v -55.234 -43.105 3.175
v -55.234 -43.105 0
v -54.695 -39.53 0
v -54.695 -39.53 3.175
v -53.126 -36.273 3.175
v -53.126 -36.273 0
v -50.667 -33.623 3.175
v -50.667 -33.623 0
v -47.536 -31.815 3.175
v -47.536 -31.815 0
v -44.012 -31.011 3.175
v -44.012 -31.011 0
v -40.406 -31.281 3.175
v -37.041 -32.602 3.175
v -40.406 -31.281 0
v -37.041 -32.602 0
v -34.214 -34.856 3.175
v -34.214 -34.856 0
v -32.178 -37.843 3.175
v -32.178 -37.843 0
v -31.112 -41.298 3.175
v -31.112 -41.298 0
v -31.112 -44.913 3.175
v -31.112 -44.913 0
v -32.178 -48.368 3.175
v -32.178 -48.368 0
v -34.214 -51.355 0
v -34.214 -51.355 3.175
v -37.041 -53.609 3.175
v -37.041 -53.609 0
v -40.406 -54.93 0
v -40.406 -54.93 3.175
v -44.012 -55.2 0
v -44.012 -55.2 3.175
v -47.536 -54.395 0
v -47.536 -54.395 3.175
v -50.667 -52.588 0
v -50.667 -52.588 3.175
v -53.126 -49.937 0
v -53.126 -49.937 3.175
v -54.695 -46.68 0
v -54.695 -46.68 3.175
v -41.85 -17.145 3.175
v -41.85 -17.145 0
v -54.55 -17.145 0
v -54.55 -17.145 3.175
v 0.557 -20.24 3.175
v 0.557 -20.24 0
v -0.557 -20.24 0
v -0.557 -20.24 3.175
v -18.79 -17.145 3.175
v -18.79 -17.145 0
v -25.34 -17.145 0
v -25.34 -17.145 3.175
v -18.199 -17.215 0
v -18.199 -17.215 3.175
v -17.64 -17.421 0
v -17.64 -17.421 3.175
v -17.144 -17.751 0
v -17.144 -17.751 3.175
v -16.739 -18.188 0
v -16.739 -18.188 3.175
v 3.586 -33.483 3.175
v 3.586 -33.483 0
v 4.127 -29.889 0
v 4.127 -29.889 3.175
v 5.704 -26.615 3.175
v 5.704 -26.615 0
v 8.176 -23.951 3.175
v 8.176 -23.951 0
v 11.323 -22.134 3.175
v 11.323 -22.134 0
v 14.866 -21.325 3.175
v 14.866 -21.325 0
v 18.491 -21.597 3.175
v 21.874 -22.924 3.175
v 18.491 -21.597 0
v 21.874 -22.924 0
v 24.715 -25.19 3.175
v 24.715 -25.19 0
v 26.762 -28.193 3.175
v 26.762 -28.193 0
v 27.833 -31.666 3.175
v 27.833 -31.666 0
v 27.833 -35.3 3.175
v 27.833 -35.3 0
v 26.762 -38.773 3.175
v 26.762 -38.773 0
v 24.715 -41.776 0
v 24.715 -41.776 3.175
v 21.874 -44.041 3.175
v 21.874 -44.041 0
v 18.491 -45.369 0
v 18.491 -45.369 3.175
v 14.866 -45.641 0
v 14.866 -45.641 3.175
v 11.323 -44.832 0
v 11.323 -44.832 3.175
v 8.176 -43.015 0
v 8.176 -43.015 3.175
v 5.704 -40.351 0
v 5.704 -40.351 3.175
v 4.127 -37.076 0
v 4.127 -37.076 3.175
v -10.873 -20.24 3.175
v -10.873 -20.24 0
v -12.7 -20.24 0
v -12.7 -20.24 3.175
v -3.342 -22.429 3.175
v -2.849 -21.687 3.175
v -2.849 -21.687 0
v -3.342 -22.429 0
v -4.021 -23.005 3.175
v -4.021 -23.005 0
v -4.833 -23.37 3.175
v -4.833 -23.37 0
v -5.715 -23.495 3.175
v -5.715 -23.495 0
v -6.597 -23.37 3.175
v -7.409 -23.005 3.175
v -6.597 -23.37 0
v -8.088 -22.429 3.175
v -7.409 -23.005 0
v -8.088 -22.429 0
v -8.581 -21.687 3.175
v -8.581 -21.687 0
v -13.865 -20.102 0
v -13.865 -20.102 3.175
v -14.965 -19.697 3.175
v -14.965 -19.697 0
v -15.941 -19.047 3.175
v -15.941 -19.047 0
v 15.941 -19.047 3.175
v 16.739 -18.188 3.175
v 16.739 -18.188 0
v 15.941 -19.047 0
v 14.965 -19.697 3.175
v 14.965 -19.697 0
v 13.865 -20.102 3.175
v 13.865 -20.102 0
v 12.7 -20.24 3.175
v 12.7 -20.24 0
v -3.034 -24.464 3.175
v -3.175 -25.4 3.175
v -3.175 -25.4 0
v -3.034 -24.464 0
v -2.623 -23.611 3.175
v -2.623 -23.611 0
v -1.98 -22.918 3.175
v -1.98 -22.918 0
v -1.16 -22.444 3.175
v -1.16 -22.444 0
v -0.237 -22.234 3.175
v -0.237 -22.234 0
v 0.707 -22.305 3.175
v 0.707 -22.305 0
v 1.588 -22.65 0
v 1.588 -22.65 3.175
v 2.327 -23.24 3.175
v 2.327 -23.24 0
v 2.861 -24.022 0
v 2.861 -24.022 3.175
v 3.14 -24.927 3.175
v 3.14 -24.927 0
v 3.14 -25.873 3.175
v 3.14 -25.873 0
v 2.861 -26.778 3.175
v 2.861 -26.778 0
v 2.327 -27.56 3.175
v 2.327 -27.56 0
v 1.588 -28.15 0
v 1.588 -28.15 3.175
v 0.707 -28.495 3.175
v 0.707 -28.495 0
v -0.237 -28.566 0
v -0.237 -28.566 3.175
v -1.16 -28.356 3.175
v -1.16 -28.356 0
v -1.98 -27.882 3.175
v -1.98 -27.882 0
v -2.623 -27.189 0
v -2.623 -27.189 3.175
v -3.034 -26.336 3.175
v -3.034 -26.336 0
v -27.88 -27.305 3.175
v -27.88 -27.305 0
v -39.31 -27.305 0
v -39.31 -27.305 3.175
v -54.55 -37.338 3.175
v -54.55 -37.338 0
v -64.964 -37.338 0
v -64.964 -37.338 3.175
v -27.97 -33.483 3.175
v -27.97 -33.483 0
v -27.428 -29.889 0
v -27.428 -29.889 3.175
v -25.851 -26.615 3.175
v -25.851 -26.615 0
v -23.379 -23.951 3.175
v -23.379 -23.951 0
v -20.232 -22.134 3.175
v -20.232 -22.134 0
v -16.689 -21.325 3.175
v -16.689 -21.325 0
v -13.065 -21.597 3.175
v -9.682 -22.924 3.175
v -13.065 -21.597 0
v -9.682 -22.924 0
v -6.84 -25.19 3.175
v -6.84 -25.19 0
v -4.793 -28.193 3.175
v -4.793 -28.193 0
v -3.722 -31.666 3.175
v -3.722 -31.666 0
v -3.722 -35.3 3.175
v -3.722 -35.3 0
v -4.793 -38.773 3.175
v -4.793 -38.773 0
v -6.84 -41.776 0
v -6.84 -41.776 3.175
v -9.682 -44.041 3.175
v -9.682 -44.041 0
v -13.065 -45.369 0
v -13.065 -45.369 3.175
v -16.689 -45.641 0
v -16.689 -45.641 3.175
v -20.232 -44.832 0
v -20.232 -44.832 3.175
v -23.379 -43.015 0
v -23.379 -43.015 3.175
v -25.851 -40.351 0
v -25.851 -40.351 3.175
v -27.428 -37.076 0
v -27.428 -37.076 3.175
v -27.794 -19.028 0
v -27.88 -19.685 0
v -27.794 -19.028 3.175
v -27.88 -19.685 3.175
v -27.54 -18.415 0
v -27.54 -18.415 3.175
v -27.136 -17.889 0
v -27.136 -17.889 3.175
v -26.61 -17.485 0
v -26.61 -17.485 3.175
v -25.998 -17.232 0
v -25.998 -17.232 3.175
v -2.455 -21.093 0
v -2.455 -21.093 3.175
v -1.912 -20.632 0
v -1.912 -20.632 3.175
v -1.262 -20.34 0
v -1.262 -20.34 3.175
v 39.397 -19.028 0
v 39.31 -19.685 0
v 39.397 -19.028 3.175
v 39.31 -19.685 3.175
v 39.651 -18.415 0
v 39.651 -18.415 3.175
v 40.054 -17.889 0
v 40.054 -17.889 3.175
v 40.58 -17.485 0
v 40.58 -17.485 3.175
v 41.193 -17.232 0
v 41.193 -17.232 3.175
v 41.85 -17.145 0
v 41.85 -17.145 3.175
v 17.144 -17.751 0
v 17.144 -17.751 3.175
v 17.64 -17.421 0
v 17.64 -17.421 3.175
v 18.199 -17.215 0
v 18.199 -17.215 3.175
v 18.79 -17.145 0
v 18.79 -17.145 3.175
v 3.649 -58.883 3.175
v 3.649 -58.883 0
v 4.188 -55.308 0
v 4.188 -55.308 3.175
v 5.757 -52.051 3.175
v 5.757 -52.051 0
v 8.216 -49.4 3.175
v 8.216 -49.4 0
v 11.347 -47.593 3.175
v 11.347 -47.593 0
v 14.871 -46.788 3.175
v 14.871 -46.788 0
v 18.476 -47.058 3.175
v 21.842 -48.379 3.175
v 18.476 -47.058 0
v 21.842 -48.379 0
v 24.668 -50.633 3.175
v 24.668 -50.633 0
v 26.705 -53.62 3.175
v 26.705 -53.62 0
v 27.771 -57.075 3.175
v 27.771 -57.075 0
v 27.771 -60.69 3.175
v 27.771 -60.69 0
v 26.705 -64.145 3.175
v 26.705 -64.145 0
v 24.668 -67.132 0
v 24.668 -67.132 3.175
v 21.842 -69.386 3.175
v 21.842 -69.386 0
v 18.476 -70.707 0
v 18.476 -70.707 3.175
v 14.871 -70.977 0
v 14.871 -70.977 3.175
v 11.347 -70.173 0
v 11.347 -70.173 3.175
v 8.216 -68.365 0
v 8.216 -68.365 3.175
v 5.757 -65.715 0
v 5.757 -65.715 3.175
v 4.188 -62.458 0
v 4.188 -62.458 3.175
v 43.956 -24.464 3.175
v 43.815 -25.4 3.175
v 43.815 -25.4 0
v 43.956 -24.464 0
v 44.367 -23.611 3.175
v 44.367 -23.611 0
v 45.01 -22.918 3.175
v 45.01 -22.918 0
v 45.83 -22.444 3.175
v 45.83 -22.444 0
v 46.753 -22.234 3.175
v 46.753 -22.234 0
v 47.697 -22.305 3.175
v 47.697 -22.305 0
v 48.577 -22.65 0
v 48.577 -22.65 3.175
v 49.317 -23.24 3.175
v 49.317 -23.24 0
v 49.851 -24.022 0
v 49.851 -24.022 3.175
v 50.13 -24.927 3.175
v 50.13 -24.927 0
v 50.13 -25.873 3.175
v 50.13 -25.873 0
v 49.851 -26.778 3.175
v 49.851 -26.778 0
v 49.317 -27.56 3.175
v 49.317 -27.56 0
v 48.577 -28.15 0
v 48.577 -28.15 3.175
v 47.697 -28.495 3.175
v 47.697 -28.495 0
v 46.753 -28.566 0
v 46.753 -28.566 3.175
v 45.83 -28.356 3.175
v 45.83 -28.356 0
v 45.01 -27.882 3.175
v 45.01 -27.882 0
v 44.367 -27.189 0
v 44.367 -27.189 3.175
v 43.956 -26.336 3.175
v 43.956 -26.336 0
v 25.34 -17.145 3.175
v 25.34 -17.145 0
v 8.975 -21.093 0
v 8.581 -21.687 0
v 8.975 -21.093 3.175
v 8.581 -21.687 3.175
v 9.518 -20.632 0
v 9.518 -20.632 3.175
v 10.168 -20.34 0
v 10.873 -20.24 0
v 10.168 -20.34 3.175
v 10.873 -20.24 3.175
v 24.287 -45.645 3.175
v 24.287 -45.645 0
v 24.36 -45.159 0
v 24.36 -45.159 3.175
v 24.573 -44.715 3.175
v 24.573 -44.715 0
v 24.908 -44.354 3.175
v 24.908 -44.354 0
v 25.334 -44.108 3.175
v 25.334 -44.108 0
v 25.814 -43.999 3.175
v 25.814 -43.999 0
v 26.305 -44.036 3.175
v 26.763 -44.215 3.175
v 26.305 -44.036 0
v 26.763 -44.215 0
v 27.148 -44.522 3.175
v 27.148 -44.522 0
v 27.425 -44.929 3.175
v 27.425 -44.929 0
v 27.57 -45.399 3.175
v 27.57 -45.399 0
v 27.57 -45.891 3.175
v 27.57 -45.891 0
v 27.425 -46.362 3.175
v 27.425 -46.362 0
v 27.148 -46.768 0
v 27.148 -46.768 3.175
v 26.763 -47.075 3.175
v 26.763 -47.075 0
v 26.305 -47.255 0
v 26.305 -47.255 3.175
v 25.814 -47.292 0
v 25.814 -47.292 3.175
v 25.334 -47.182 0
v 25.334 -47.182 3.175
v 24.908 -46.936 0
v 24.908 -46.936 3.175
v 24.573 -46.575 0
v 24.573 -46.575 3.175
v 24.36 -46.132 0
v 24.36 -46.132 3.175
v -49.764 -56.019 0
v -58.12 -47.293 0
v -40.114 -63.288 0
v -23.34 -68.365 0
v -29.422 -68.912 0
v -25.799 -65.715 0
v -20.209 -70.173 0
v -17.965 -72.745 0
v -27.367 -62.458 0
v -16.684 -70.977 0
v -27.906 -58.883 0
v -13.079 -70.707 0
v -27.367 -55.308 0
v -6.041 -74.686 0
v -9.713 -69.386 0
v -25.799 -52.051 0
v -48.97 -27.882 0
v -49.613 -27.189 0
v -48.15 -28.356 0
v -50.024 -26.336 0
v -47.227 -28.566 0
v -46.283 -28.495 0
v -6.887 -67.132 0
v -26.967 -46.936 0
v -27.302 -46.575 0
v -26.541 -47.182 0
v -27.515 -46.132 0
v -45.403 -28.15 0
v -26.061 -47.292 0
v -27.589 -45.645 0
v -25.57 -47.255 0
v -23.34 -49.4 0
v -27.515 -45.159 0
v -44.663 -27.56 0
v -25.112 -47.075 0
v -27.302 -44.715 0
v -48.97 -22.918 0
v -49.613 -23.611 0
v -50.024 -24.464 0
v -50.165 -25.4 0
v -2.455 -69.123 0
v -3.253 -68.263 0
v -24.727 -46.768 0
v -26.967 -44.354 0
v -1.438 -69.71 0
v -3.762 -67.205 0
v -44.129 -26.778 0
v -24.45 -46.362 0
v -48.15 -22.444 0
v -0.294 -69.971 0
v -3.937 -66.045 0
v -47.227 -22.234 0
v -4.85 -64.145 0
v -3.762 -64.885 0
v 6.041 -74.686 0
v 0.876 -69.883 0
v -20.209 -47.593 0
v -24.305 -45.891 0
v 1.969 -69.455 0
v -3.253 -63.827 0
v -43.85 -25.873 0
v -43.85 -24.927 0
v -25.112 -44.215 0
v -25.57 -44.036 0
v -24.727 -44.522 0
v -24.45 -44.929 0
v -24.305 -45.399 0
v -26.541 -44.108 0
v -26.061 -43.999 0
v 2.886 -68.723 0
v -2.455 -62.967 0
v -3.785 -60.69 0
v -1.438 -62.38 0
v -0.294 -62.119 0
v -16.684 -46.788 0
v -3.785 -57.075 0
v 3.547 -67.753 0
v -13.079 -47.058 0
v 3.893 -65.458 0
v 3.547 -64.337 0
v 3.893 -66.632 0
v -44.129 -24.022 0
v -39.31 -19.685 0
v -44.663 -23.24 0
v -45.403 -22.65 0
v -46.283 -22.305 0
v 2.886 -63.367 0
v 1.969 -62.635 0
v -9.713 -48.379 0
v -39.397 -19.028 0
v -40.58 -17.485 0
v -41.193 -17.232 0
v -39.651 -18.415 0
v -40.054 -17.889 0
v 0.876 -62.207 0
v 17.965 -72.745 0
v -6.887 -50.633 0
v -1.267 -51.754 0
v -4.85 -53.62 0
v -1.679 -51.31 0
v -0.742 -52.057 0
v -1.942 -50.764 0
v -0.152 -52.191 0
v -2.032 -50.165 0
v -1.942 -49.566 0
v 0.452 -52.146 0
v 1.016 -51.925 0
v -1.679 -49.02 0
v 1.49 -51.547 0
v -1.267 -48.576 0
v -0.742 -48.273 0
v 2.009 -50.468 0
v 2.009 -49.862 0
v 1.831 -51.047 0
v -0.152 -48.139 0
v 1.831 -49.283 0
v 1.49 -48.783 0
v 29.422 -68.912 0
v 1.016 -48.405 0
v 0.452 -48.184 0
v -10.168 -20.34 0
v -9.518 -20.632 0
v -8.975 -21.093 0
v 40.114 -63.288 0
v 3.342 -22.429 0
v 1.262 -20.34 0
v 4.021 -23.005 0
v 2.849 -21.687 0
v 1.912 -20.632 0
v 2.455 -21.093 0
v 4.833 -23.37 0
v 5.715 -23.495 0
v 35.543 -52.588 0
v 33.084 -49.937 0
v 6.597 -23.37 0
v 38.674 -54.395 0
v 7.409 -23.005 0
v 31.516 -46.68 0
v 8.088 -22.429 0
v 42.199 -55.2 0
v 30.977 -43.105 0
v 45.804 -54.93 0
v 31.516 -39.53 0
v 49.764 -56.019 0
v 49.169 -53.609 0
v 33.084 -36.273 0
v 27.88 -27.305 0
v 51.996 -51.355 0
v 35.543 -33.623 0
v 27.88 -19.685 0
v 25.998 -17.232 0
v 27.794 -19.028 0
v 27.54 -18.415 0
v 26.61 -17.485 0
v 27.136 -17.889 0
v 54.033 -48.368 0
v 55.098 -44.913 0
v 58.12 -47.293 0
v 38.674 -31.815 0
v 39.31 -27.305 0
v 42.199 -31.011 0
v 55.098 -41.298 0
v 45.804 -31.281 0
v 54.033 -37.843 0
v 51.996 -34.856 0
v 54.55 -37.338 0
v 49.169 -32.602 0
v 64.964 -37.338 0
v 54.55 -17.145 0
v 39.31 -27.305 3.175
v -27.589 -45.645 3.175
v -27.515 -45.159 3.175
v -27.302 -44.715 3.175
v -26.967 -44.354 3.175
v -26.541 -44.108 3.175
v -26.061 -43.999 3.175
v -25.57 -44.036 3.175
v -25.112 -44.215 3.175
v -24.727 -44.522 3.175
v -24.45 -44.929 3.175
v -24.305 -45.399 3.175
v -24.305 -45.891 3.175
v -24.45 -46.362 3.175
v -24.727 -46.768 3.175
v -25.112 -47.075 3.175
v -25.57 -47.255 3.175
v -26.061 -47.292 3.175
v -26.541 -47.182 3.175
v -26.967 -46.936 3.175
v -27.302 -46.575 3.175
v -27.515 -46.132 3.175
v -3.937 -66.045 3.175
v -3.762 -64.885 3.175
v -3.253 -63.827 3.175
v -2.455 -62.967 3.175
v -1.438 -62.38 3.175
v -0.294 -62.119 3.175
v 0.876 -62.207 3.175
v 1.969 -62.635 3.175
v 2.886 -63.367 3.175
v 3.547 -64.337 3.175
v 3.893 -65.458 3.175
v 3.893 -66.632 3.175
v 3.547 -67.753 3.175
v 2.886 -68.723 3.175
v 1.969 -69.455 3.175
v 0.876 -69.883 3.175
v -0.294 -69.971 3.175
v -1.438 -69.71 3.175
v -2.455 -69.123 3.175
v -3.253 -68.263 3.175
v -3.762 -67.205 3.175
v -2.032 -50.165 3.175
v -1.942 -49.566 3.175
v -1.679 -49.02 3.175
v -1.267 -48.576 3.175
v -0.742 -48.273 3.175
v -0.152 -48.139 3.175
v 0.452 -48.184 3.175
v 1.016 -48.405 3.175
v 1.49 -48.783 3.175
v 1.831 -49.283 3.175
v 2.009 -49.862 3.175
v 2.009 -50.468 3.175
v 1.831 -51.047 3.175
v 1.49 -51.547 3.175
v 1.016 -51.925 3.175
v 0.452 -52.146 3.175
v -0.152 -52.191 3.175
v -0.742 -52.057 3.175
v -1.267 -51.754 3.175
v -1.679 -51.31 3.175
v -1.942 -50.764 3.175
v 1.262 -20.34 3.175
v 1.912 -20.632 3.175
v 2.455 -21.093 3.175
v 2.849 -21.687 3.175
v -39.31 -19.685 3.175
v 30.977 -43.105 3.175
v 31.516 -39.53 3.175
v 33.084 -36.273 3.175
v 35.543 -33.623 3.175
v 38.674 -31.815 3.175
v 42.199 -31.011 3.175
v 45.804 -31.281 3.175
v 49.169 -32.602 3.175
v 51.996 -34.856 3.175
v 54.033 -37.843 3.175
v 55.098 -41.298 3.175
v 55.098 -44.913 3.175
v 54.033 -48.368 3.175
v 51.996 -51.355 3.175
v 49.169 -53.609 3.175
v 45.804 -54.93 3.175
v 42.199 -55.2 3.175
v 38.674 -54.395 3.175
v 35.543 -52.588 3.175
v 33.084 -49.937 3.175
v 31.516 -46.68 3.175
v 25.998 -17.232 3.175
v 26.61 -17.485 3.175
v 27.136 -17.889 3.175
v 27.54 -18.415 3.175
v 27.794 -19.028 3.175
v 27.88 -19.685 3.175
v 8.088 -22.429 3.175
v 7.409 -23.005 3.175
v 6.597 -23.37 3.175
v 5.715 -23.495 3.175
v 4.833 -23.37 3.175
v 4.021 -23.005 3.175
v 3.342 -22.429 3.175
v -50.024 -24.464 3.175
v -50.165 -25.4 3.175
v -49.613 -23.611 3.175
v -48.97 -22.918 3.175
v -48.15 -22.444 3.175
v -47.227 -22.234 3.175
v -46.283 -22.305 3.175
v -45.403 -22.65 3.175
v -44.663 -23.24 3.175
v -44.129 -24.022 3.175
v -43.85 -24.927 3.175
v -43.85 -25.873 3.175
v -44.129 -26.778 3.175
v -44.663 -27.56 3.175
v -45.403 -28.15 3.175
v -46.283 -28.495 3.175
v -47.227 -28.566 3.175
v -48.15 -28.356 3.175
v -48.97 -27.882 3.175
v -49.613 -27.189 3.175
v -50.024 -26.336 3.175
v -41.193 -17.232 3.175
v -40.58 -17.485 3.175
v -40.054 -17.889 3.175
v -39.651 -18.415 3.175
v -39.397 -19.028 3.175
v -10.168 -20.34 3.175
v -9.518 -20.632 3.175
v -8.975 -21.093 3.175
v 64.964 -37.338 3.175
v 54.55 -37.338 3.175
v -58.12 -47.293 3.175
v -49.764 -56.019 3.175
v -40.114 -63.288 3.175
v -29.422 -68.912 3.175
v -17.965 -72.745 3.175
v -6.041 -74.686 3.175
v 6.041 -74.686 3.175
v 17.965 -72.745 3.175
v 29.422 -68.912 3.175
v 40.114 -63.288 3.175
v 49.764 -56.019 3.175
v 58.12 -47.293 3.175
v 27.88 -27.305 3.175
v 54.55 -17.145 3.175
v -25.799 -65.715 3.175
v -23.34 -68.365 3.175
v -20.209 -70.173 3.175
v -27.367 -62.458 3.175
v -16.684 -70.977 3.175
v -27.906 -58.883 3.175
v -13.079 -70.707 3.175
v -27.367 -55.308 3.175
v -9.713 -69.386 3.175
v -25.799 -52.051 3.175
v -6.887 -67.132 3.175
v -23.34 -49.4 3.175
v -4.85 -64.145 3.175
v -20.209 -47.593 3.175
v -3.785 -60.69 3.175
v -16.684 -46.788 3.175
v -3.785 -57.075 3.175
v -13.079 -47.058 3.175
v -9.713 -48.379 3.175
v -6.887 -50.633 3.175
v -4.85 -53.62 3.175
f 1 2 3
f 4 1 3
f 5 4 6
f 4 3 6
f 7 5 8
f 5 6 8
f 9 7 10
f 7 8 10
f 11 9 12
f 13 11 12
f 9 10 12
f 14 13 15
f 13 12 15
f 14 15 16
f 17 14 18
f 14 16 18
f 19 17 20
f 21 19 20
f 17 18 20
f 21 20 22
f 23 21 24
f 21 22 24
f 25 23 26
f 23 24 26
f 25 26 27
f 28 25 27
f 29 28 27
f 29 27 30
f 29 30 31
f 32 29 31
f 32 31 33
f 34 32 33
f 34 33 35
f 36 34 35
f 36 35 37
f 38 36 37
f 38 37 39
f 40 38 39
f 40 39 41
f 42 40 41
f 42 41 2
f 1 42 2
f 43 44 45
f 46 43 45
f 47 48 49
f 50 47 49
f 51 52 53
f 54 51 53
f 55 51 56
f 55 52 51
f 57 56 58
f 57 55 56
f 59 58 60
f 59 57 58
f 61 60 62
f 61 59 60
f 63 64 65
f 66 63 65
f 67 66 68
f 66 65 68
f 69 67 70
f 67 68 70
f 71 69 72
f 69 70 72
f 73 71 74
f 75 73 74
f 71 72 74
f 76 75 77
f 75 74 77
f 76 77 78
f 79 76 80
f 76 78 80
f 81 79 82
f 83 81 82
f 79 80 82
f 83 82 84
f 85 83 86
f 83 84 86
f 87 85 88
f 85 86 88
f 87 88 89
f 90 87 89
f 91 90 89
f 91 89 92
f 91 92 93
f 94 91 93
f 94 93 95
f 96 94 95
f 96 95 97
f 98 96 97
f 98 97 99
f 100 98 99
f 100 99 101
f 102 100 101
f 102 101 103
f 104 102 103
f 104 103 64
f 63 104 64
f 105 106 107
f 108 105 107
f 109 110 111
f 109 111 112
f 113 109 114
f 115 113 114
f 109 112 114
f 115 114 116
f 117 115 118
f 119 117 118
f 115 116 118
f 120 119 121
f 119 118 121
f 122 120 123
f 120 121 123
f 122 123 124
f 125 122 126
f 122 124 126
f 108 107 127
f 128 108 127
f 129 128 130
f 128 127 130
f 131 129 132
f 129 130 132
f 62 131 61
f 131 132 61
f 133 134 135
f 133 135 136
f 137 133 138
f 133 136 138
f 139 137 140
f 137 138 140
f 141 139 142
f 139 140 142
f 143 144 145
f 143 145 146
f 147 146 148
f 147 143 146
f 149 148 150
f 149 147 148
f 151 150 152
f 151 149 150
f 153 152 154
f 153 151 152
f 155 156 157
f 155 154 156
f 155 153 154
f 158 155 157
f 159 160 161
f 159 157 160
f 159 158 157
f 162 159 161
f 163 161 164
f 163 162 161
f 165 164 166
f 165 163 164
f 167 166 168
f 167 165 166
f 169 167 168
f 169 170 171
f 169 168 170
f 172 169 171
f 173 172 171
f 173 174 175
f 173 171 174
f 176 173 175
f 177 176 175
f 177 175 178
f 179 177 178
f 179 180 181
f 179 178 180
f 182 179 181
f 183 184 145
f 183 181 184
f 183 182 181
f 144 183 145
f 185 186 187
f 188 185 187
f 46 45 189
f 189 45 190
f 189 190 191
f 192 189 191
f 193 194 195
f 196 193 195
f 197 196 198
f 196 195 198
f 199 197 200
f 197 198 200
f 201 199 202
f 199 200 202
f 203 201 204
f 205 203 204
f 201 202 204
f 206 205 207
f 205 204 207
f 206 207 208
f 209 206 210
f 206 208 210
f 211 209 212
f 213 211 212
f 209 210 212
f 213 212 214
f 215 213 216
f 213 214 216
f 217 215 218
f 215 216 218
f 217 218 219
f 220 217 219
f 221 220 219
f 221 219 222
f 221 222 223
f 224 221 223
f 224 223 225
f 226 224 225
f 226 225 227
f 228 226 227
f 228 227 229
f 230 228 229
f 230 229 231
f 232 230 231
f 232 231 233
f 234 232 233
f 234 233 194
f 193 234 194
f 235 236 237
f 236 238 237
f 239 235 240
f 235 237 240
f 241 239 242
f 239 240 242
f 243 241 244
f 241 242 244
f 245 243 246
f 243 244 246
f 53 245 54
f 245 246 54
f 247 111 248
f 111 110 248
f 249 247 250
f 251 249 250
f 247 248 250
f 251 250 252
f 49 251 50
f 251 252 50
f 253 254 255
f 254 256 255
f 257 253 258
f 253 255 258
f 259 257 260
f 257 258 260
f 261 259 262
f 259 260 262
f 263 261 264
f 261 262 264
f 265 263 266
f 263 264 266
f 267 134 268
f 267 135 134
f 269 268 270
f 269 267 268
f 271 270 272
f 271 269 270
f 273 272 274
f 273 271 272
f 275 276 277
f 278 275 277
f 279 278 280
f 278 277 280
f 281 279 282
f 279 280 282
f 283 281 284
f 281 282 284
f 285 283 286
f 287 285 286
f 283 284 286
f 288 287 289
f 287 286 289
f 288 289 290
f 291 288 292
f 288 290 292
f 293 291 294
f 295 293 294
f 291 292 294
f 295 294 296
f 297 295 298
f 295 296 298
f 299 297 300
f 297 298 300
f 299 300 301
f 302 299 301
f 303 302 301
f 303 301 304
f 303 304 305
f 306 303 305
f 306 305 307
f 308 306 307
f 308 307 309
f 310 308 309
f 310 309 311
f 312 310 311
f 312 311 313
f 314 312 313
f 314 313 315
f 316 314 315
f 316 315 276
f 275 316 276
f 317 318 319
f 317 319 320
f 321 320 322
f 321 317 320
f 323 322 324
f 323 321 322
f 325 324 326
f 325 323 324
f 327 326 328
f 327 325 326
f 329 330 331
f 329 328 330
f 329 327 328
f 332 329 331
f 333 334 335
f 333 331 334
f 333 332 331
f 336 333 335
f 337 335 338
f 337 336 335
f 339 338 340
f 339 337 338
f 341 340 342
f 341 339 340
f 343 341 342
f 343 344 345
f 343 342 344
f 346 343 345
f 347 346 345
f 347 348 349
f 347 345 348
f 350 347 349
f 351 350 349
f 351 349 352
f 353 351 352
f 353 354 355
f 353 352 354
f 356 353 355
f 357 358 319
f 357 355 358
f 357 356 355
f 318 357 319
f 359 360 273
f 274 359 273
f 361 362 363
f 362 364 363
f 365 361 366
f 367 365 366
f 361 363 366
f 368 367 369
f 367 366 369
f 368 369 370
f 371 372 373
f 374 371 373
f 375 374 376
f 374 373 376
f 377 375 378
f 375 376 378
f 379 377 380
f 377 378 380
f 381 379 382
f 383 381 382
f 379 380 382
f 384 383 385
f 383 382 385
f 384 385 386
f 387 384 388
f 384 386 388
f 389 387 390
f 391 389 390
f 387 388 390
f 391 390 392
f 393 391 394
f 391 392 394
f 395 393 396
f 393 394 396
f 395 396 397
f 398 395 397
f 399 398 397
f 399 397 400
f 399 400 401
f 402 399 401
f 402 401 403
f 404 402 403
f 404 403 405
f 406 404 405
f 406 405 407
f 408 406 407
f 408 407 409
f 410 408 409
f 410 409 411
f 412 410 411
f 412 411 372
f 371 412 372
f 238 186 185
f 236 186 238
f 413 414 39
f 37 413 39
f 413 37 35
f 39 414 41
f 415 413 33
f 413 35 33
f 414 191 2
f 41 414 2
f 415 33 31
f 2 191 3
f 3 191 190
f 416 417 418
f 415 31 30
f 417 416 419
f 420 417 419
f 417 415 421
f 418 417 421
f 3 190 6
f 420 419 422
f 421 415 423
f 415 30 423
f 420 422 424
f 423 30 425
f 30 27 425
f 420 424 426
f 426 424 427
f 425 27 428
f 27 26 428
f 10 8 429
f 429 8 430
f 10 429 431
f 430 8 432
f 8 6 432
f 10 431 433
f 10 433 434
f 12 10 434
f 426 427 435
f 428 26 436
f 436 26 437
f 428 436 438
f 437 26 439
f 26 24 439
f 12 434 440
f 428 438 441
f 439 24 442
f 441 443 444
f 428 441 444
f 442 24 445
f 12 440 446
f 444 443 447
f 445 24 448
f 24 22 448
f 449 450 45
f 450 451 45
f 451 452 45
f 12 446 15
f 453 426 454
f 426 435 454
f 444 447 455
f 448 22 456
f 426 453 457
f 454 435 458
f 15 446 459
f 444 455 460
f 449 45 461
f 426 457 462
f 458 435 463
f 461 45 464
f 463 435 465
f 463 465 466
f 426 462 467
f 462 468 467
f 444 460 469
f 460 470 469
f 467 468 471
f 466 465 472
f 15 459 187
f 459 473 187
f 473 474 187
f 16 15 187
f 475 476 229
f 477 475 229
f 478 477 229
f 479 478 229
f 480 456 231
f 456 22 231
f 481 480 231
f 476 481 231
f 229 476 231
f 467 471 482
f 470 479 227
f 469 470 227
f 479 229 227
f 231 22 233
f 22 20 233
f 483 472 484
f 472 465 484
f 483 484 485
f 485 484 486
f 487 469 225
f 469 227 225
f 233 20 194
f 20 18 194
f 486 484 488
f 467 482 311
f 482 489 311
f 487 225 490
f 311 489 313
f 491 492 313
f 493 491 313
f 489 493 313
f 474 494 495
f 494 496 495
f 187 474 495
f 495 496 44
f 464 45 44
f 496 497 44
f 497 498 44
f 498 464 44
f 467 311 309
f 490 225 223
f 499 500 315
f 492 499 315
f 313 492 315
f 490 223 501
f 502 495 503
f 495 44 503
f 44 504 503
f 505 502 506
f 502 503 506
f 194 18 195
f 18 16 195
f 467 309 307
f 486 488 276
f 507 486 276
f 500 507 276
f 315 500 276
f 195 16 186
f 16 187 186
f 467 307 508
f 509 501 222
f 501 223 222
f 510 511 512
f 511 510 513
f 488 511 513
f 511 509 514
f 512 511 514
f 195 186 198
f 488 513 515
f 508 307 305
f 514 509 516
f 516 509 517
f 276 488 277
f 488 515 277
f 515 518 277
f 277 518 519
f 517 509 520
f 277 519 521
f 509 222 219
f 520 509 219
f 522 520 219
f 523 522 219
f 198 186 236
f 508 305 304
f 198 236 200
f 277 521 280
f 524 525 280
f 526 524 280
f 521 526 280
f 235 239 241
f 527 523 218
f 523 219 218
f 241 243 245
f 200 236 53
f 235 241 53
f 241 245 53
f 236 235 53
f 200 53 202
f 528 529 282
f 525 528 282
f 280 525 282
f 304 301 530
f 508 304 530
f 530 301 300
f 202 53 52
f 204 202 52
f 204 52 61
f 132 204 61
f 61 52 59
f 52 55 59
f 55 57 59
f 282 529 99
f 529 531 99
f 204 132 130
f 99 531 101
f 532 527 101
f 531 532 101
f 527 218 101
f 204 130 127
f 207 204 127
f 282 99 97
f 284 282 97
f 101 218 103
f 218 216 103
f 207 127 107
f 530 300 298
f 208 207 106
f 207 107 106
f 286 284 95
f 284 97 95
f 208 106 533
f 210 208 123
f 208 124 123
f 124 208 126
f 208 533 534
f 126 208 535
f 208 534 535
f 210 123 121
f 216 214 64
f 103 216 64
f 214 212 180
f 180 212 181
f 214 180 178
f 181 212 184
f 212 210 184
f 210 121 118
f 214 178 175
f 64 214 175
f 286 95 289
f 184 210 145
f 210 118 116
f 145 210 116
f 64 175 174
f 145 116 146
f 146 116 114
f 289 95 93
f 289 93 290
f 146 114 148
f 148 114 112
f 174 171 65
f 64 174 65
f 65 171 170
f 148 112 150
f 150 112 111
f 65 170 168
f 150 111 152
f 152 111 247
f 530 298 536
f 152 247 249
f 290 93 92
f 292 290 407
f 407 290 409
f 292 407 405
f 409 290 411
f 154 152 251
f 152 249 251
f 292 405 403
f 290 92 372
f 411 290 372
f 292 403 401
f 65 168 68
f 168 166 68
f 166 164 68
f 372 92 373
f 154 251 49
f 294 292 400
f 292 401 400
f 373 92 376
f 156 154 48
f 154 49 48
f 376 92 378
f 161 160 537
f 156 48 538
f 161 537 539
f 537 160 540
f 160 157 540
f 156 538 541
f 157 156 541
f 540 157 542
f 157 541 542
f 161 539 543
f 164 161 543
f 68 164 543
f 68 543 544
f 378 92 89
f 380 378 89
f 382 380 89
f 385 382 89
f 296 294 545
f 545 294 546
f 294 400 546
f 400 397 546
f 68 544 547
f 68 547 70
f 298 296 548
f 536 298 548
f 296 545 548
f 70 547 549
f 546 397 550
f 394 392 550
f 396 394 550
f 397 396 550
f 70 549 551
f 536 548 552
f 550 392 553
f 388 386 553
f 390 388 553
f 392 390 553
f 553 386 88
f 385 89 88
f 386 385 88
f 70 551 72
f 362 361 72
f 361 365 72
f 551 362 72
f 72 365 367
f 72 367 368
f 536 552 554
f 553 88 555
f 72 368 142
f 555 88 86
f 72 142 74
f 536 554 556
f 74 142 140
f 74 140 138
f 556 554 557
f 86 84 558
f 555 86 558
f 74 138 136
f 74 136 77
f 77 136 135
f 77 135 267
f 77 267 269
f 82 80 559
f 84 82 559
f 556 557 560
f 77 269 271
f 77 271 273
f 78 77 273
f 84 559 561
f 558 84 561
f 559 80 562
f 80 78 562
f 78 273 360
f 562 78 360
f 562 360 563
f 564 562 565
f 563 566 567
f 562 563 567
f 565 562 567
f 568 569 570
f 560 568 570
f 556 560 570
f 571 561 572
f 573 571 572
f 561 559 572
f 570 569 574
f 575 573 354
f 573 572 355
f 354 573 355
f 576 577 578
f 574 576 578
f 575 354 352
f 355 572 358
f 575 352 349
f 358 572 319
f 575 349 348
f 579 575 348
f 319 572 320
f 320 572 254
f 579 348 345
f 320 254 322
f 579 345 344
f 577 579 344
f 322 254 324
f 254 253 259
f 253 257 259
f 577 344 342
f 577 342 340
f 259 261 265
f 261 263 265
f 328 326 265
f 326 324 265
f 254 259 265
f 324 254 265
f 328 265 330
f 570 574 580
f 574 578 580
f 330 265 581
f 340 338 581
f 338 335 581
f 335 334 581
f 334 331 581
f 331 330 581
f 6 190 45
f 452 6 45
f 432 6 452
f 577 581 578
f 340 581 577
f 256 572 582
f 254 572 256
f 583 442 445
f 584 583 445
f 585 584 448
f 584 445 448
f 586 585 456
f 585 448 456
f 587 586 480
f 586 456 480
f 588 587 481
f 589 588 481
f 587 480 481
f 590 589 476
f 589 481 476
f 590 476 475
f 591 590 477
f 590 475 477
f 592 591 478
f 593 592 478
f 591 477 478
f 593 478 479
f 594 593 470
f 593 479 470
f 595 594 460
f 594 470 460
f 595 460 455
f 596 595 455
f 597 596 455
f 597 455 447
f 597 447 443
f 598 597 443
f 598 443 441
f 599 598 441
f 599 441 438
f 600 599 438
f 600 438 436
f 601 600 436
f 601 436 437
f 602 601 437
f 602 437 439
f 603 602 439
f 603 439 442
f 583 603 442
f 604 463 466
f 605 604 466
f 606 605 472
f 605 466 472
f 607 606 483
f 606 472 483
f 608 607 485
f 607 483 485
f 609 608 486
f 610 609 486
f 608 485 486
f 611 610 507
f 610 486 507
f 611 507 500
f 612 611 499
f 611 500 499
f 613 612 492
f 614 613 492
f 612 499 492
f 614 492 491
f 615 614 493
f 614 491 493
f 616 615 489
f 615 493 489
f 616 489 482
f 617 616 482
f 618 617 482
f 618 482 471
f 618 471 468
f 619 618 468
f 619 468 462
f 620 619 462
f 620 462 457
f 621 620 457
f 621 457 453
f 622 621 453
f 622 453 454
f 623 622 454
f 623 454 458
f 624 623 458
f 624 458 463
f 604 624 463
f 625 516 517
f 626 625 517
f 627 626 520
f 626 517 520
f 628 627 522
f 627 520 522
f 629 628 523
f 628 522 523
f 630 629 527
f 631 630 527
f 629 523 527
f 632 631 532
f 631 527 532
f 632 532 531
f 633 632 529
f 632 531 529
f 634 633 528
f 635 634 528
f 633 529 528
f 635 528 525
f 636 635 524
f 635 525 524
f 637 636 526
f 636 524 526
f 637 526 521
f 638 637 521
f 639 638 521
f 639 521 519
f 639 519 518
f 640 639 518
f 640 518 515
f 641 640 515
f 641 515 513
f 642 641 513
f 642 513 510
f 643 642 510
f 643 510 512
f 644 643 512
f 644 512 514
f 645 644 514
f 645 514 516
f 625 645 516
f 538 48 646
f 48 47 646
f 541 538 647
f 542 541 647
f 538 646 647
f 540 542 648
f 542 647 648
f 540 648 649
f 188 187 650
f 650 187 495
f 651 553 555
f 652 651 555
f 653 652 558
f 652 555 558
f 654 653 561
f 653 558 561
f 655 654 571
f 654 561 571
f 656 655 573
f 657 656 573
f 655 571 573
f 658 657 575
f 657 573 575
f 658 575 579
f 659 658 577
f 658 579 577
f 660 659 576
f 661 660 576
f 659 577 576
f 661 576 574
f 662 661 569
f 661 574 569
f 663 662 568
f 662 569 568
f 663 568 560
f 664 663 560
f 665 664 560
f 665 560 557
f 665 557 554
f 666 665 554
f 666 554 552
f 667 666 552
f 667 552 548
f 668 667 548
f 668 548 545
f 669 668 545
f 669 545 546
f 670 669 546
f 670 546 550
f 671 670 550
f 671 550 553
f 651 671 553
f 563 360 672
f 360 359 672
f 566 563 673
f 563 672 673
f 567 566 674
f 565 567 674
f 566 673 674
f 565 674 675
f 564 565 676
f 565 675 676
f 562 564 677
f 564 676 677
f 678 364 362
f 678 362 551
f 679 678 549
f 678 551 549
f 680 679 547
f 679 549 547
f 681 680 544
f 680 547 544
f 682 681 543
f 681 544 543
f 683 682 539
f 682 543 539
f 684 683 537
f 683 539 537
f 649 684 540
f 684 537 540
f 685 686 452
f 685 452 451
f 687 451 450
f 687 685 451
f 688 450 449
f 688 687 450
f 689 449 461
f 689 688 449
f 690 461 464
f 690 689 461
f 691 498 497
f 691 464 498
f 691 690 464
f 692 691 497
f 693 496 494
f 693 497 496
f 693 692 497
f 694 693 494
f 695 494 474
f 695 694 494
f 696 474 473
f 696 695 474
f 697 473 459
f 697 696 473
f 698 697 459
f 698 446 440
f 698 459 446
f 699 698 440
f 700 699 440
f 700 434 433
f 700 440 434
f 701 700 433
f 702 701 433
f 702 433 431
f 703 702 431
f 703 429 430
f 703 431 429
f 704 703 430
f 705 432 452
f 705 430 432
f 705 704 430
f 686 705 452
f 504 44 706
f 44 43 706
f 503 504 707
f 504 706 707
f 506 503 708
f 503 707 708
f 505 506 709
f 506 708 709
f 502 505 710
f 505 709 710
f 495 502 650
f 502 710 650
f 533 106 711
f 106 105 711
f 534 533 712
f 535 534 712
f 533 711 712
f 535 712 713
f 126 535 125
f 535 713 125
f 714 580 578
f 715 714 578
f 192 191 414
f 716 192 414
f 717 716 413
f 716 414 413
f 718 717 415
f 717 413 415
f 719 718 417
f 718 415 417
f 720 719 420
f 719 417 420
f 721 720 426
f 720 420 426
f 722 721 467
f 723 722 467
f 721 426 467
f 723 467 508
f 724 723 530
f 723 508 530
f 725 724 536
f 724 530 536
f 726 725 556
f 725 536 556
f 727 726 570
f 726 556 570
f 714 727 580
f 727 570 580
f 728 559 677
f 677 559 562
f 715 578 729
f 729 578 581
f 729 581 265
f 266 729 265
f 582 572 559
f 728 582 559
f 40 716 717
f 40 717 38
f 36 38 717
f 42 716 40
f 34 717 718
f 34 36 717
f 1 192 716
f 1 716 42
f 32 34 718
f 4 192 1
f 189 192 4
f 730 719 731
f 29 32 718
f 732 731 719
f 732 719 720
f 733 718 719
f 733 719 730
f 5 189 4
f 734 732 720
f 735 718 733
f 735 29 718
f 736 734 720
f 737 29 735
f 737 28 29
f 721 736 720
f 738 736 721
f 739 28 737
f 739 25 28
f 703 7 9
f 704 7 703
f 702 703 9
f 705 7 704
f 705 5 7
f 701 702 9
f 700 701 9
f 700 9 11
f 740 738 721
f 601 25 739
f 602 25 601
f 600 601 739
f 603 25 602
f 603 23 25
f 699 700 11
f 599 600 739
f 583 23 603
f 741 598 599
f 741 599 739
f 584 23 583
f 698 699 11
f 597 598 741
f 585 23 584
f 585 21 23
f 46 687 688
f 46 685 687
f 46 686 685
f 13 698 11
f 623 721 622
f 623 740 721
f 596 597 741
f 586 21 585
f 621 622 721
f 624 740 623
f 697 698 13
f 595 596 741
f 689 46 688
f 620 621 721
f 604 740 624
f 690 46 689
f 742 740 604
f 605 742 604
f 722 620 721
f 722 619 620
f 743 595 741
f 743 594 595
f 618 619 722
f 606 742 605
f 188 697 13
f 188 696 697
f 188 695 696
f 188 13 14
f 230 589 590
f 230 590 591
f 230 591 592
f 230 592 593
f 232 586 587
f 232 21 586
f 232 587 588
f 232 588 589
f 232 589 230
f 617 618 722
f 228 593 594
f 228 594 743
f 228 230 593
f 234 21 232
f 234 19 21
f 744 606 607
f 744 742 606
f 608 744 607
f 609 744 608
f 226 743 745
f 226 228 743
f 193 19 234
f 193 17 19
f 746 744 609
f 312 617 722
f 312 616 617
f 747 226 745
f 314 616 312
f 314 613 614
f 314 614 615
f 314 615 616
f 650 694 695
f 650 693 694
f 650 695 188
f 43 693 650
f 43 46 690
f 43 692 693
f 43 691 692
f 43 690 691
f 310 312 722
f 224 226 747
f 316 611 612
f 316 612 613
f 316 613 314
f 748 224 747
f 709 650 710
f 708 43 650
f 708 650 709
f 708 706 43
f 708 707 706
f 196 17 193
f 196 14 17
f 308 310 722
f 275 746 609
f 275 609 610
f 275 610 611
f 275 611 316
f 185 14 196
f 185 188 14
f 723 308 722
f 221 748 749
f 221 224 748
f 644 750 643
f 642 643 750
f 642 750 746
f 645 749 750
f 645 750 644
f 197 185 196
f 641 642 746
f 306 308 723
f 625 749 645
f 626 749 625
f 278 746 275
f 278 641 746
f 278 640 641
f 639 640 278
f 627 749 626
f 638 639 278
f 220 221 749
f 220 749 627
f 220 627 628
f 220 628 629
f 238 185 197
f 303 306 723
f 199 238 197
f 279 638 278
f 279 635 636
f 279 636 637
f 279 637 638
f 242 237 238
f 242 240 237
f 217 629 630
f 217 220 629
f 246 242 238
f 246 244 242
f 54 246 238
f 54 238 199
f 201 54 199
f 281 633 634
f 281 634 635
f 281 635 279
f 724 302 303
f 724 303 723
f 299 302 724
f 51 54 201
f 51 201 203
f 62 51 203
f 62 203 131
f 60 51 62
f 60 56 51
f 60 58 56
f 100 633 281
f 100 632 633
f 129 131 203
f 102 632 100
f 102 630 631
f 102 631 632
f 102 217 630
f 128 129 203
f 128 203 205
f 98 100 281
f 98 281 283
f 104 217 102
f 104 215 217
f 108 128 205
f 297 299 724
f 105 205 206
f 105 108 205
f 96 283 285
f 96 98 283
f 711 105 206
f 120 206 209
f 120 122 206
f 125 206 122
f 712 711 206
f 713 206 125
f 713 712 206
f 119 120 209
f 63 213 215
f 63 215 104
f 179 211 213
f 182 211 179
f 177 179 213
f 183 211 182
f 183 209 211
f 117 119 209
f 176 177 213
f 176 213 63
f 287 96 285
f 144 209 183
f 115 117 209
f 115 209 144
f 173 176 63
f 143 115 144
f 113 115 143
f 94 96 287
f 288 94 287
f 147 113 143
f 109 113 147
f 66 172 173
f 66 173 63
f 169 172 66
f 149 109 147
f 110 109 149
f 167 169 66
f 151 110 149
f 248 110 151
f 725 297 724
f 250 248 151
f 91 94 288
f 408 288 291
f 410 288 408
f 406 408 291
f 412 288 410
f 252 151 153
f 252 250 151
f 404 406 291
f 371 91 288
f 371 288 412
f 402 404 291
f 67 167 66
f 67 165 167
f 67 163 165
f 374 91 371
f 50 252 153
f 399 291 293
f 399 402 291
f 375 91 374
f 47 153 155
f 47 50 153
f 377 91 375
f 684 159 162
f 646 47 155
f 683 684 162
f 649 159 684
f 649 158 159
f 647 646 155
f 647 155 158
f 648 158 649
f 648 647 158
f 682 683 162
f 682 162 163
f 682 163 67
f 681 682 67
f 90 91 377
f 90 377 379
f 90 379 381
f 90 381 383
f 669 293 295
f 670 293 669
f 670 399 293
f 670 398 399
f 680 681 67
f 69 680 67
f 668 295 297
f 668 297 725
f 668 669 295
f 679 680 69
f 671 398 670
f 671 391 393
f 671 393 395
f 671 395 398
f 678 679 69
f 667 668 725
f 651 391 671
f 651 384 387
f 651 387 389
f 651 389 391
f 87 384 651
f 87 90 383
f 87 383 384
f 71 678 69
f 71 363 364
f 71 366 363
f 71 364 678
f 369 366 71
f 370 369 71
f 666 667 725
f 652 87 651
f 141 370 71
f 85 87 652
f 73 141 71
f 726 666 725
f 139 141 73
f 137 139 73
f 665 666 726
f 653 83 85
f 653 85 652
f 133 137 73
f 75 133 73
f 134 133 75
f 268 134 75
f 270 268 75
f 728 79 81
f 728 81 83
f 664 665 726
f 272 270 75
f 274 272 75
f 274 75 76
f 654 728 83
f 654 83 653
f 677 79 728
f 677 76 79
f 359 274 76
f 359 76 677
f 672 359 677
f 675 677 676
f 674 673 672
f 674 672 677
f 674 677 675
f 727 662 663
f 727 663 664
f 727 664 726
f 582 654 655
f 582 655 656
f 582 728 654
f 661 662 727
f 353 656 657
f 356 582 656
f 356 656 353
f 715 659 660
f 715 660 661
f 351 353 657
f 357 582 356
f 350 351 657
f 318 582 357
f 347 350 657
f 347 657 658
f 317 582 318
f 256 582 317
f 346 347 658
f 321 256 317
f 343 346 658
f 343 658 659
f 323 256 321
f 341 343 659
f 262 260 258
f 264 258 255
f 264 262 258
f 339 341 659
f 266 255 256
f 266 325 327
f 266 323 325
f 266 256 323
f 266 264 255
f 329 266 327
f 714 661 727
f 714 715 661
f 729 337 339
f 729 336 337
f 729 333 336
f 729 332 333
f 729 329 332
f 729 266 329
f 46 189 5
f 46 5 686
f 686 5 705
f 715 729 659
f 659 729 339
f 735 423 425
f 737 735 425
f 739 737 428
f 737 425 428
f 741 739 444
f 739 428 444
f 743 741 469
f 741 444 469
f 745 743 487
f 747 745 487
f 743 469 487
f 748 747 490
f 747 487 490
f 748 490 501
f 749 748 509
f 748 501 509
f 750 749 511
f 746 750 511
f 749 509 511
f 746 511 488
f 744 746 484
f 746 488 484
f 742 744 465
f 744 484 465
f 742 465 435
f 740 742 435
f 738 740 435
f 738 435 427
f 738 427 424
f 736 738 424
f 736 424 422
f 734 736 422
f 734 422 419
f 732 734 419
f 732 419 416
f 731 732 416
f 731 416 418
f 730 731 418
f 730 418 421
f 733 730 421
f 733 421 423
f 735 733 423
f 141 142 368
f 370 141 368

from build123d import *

# Parameters (mm, degrees)
SKETCH1_R                = 1.651
BOSS_EXTRUDE2_DEPTH      = 3.175
SKETCH2_R                = 1.143
CUT_EXTRUDE1_DEPTH       = 4.175
SKETCH3_R                = 12.1285
CUT_EXTRUDE2_DEPTH       = 4.175
SKETCH4_W                = 28.562713242
SKETCH4_H                = 11.677503754
BOSS_EXTRUDE3_DEPTH      = 3.175
SKETCH5_W                = 216.7214489
SKETCH5_H                = 130.569220634
CUT_EXTRUDE4_DEPTH       = 4.175
SKETCH11_R               = 3.937
CUT_EXTRUDE11_DEPTH      = 4.175
SKETCH12_W               = 11.43
SKETCH12_H               = 10.16
CUT_EXTRUDE12_DEPTH      = 4.175
SKETCH16_R               = 12.192
CUT_EXTRUDE16_DEPTH      = 21.59
SKETCH57_R               = 1.651
CUT_EXTRUDE57_DEPTH      = 58.674
SKETCH58_R               = 3.175
CUT_EXTRUDE58_DEPTH      = 103.378
CUT_EXTRUDE58_DEPTH_BACK = 48.768
CUT_EXTRUDE15_DEPTH      = 21.59
FILLET1_R                = 2.54
SKETCH59_R               = 2.032
CUT_EXTRUDE59_DEPTH      = 11.938


with BuildPart() as part:
    # Sketch1 → Boss-Extrude2 (new body)
    with BuildSketch(Plane.XY):
        with BuildLine():
            Line((-64.964441474, 37.338), (-54.550441474, 37.338))
            Line((-54.550441474, 37.338), (-54.550441474, -37.338))
            Line((-54.550441474, -37.338), (-64.964441474, -37.338))
            ThreePointArc((-64.964441474, -37.338), (0, -74.93), (64.964441474, -37.338))
            Line((64.964441474, -37.338), (54.550441474, -37.338))
            Line((54.550441474, -37.338), (54.550441474, 37.338))
            Line((54.550441474, 37.338), (64.964441474, 37.338))
            ThreePointArc((64.964441474, 37.338), (0, 74.93), (-64.964441474, 37.338))
        make_face()
        with Locations((-46.482, 11.049)):
            Circle(SKETCH1_R, mode=Mode.SUBTRACT)
        with Locations((-21.083270032, 10.795)):
            Circle(SKETCH1_R, mode=Mode.SUBTRACT)
        with Locations((-21.083270032, -10.795)):
            Circle(SKETCH1_R, mode=Mode.SUBTRACT)
        with Locations((-46.482, -11.049)):
            Circle(SKETCH1_R, mode=Mode.SUBTRACT)
        with Locations((46.482, -11.049)):
            Circle(SKETCH1_R, mode=Mode.SUBTRACT)
        with Locations((21.083270032, -10.795)):
            Circle(SKETCH1_R, mode=Mode.SUBTRACT)
        with Locations((21.083270032, 10.795)):
            Circle(SKETCH1_R, mode=Mode.SUBTRACT)
        with Locations((46.482, 11.049)):
            Circle(SKETCH1_R, mode=Mode.SUBTRACT)
    extrude(amount=BOSS_EXTRUDE2_DEPTH)

    # Sketch2 → Cut-Extrude1 (cut, through all)
    with BuildSketch(Plane.XY.offset(3.175)):
        with Locations((-6.731, 62.23)):
            Circle(SKETCH2_R)
        with Locations((6.731, 62.23)):
            Circle(SKETCH2_R)
    extrude(amount=-CUT_EXTRUDE1_DEPTH, mode=Mode.SUBTRACT)

    # Sketch3 → Cut-Extrude2 (cut, through all)
    with BuildSketch(Plane(origin=(0, 0, 0), x_dir=(-1, 0, 0), z_dir=(0, 0, -1))):
        with Locations((-15.777608989, -58.882838371)):
            Circle(SKETCH3_R)
        with Locations((15.777608989, -58.882838371)):
            Circle(SKETCH3_R)
        with Locations((-43.105229381, -43.105229381)):
            Circle(SKETCH3_R)
        with Locations((-43.105229381, 43.105229381)):
            Circle(SKETCH3_R)
        with Locations((43.105229381, 43.105229381)):
            Circle(SKETCH3_R)
        with Locations((43.105229381, -43.105229381)):
            Circle(SKETCH3_R)
    extrude(amount=-CUT_EXTRUDE2_DEPTH, mode=Mode.SUBTRACT)

    # Sketch4 → Boss-Extrude3 (add)
    with BuildSketch(Plane(origin=(0, 0, 0), x_dir=(-1, 0, 0), z_dir=(0, 0, -1))):
        with Locations((-1.488809975, 62.152540216)):
            Rectangle(SKETCH4_W, SKETCH4_H)
    extrude(amount=-BOSS_EXTRUDE3_DEPTH)

    # Sketch5 → Cut-Extrude4 (cut, through all)
    with BuildSketch(Plane(origin=(0, 0, 0), x_dir=(-1, 0, 0), z_dir=(0, 0, -1))):
        with Locations((23.316688373, 48.139610317)):
            Rectangle(SKETCH5_W, SKETCH5_H)
    extrude(amount=-CUT_EXTRUDE4_DEPTH, mode=Mode.SUBTRACT)

    # Sketch11 → Cut-Extrude11 (cut, through all)
    with BuildSketch(Plane(origin=(0, 0, 0), x_dir=(-1, 0, 0), z_dir=(0, 0, -1))):
        with Locations((0, -66.045)):
            Circle(SKETCH11_R)
    extrude(amount=-CUT_EXTRUDE11_DEPTH, mode=Mode.SUBTRACT)

    # Sketch12 → Cut-Extrude12 (cut, through all)
    with BuildSketch(Plane(origin=(0, 0, 0), x_dir=(-1, 0, 0), z_dir=(0, 0, -1))):
        with Locations((-33.595441474, -22.225)):
            Rectangle(SKETCH12_W, SKETCH12_H)
        with Locations((33.595441474, -22.225)):
            Rectangle(SKETCH12_W, SKETCH12_H)
    extrude(amount=-CUT_EXTRUDE12_DEPTH, mode=Mode.SUBTRACT)

    # Sketch16 → Cut-Extrude16 (cut)
    with BuildSketch(Plane(origin=(0, 0, 0), x_dir=(-1, 0, 0), z_dir=(0, 0, -1))):
        with Locations((15.777608989, -33.482838371)):
            Circle(SKETCH16_R)
        with Locations((-15.777608989, -33.482838371)):
            Circle(SKETCH16_R)
    extrude(amount=-CUT_EXTRUDE16_DEPTH, mode=Mode.SUBTRACT)

    # Sketch57 → Cut-Extrude57 (cut)
    with BuildSketch(Plane(origin=(0, 0, 0), x_dir=(-1, 0, 0), z_dir=(0, 0, -1))):
        with Locations((-25.937608989, -45.645229381)):
            Circle(SKETCH57_R)
        with Locations((25.937608989, -45.645229381)):
            Circle(SKETCH57_R)
    extrude(amount=-CUT_EXTRUDE57_DEPTH, mode=Mode.SUBTRACT)

    # Sketch58 → Cut-Extrude58 (cut, two sides)
    with BuildSketch(Plane(origin=(30.092005081, 4.08352975, 36.1315), x_dir=(-1, 0, 0), z_dir=(0, 0, -1))) as cut_extrude58_sk:
        with Locations((77.082005081, -29.48352975)):
            Circle(SKETCH58_R)
        with Locations((30.092005081, -29.48352975)):
            Circle(SKETCH58_R)
        with Locations((-16.897994919, -29.48352975)):
            Circle(SKETCH58_R)
    extrude(amount=CUT_EXTRUDE58_DEPTH, mode=Mode.SUBTRACT)
    extrude(cut_extrude58_sk.sketch, amount=-CUT_EXTRUDE58_DEPTH_BACK, mode=Mode.SUBTRACT)

    # Sketch15 → Cut-Extrude15 (cut)
    with BuildSketch(Plane(origin=(0, 0, 0), x_dir=(-1, 0, 0), z_dir=(0, 0, -1))):
        with BuildLine():
            Line((-12.7, -20.24), (-8.888991966, -20.24))
            ThreePointArc((-8.888991966, -20.24), (-5.715, -23.495), (-2.541008034, -20.24))
            Line((-2.541008034, -20.24), (2.541008034, -20.24))
            ThreePointArc((2.541008034, -20.24), (5.715, -23.495), (8.888991966, -20.24))
            Line((8.888991966, -20.24), (12.7, -20.24))
            ThreePointArc((12.7, -20.24), (16.235533906, -11.704466094), (7.7, -15.24))
            Line((7.7, -15.24), (-1.06, -15.24))
            ThreePointArc((-1.06, -15.24), (-4.010609847, -10.6792983), (-9.38, -11.501337137))
            ThreePointArc((-9.38, -11.501337137), (-17.374040774, -13.464234575), (-12.7, -20.24))
        make_face()
    extrude(amount=-CUT_EXTRUDE15_DEPTH, mode=Mode.SUBTRACT)

    # Fillet1
    fillet1_edges = [part.edges().sort_by_distance(p)[0] for p in [
        (39.310441474, -17.145, 1.5875),
        (27.880441474, -17.145, 1.5875),
        (-27.880441474, -17.145, 1.5875),
        (-39.310441474, -17.145, 1.5875),
        (-17.322875188, -17.145, 1.5875),
        (17.322875188, -17.145, 1.5875),
        (-8.888991966, -20.24, 1.5875),
        (-2.541008034, -20.24, 1.5875),
        (2.541008034, -20.24, 1.5875),
        (8.888991966, -20.24, 1.5875),
    ]]
    fillet(fillet1_edges, radius=FILLET1_R)

    # Sketch59 → Cut-Extrude59 (cut)
    with BuildSketch(Plane(origin=(0, 0, 0), x_dir=(-1, 0, 0), z_dir=(0, 0, -1))):
        with Locations((0, -50.165)):
            Circle(SKETCH59_R)
    extrude(amount=-CUT_EXTRUDE59_DEPTH, mode=Mode.SUBTRACT)


solid = part.part
